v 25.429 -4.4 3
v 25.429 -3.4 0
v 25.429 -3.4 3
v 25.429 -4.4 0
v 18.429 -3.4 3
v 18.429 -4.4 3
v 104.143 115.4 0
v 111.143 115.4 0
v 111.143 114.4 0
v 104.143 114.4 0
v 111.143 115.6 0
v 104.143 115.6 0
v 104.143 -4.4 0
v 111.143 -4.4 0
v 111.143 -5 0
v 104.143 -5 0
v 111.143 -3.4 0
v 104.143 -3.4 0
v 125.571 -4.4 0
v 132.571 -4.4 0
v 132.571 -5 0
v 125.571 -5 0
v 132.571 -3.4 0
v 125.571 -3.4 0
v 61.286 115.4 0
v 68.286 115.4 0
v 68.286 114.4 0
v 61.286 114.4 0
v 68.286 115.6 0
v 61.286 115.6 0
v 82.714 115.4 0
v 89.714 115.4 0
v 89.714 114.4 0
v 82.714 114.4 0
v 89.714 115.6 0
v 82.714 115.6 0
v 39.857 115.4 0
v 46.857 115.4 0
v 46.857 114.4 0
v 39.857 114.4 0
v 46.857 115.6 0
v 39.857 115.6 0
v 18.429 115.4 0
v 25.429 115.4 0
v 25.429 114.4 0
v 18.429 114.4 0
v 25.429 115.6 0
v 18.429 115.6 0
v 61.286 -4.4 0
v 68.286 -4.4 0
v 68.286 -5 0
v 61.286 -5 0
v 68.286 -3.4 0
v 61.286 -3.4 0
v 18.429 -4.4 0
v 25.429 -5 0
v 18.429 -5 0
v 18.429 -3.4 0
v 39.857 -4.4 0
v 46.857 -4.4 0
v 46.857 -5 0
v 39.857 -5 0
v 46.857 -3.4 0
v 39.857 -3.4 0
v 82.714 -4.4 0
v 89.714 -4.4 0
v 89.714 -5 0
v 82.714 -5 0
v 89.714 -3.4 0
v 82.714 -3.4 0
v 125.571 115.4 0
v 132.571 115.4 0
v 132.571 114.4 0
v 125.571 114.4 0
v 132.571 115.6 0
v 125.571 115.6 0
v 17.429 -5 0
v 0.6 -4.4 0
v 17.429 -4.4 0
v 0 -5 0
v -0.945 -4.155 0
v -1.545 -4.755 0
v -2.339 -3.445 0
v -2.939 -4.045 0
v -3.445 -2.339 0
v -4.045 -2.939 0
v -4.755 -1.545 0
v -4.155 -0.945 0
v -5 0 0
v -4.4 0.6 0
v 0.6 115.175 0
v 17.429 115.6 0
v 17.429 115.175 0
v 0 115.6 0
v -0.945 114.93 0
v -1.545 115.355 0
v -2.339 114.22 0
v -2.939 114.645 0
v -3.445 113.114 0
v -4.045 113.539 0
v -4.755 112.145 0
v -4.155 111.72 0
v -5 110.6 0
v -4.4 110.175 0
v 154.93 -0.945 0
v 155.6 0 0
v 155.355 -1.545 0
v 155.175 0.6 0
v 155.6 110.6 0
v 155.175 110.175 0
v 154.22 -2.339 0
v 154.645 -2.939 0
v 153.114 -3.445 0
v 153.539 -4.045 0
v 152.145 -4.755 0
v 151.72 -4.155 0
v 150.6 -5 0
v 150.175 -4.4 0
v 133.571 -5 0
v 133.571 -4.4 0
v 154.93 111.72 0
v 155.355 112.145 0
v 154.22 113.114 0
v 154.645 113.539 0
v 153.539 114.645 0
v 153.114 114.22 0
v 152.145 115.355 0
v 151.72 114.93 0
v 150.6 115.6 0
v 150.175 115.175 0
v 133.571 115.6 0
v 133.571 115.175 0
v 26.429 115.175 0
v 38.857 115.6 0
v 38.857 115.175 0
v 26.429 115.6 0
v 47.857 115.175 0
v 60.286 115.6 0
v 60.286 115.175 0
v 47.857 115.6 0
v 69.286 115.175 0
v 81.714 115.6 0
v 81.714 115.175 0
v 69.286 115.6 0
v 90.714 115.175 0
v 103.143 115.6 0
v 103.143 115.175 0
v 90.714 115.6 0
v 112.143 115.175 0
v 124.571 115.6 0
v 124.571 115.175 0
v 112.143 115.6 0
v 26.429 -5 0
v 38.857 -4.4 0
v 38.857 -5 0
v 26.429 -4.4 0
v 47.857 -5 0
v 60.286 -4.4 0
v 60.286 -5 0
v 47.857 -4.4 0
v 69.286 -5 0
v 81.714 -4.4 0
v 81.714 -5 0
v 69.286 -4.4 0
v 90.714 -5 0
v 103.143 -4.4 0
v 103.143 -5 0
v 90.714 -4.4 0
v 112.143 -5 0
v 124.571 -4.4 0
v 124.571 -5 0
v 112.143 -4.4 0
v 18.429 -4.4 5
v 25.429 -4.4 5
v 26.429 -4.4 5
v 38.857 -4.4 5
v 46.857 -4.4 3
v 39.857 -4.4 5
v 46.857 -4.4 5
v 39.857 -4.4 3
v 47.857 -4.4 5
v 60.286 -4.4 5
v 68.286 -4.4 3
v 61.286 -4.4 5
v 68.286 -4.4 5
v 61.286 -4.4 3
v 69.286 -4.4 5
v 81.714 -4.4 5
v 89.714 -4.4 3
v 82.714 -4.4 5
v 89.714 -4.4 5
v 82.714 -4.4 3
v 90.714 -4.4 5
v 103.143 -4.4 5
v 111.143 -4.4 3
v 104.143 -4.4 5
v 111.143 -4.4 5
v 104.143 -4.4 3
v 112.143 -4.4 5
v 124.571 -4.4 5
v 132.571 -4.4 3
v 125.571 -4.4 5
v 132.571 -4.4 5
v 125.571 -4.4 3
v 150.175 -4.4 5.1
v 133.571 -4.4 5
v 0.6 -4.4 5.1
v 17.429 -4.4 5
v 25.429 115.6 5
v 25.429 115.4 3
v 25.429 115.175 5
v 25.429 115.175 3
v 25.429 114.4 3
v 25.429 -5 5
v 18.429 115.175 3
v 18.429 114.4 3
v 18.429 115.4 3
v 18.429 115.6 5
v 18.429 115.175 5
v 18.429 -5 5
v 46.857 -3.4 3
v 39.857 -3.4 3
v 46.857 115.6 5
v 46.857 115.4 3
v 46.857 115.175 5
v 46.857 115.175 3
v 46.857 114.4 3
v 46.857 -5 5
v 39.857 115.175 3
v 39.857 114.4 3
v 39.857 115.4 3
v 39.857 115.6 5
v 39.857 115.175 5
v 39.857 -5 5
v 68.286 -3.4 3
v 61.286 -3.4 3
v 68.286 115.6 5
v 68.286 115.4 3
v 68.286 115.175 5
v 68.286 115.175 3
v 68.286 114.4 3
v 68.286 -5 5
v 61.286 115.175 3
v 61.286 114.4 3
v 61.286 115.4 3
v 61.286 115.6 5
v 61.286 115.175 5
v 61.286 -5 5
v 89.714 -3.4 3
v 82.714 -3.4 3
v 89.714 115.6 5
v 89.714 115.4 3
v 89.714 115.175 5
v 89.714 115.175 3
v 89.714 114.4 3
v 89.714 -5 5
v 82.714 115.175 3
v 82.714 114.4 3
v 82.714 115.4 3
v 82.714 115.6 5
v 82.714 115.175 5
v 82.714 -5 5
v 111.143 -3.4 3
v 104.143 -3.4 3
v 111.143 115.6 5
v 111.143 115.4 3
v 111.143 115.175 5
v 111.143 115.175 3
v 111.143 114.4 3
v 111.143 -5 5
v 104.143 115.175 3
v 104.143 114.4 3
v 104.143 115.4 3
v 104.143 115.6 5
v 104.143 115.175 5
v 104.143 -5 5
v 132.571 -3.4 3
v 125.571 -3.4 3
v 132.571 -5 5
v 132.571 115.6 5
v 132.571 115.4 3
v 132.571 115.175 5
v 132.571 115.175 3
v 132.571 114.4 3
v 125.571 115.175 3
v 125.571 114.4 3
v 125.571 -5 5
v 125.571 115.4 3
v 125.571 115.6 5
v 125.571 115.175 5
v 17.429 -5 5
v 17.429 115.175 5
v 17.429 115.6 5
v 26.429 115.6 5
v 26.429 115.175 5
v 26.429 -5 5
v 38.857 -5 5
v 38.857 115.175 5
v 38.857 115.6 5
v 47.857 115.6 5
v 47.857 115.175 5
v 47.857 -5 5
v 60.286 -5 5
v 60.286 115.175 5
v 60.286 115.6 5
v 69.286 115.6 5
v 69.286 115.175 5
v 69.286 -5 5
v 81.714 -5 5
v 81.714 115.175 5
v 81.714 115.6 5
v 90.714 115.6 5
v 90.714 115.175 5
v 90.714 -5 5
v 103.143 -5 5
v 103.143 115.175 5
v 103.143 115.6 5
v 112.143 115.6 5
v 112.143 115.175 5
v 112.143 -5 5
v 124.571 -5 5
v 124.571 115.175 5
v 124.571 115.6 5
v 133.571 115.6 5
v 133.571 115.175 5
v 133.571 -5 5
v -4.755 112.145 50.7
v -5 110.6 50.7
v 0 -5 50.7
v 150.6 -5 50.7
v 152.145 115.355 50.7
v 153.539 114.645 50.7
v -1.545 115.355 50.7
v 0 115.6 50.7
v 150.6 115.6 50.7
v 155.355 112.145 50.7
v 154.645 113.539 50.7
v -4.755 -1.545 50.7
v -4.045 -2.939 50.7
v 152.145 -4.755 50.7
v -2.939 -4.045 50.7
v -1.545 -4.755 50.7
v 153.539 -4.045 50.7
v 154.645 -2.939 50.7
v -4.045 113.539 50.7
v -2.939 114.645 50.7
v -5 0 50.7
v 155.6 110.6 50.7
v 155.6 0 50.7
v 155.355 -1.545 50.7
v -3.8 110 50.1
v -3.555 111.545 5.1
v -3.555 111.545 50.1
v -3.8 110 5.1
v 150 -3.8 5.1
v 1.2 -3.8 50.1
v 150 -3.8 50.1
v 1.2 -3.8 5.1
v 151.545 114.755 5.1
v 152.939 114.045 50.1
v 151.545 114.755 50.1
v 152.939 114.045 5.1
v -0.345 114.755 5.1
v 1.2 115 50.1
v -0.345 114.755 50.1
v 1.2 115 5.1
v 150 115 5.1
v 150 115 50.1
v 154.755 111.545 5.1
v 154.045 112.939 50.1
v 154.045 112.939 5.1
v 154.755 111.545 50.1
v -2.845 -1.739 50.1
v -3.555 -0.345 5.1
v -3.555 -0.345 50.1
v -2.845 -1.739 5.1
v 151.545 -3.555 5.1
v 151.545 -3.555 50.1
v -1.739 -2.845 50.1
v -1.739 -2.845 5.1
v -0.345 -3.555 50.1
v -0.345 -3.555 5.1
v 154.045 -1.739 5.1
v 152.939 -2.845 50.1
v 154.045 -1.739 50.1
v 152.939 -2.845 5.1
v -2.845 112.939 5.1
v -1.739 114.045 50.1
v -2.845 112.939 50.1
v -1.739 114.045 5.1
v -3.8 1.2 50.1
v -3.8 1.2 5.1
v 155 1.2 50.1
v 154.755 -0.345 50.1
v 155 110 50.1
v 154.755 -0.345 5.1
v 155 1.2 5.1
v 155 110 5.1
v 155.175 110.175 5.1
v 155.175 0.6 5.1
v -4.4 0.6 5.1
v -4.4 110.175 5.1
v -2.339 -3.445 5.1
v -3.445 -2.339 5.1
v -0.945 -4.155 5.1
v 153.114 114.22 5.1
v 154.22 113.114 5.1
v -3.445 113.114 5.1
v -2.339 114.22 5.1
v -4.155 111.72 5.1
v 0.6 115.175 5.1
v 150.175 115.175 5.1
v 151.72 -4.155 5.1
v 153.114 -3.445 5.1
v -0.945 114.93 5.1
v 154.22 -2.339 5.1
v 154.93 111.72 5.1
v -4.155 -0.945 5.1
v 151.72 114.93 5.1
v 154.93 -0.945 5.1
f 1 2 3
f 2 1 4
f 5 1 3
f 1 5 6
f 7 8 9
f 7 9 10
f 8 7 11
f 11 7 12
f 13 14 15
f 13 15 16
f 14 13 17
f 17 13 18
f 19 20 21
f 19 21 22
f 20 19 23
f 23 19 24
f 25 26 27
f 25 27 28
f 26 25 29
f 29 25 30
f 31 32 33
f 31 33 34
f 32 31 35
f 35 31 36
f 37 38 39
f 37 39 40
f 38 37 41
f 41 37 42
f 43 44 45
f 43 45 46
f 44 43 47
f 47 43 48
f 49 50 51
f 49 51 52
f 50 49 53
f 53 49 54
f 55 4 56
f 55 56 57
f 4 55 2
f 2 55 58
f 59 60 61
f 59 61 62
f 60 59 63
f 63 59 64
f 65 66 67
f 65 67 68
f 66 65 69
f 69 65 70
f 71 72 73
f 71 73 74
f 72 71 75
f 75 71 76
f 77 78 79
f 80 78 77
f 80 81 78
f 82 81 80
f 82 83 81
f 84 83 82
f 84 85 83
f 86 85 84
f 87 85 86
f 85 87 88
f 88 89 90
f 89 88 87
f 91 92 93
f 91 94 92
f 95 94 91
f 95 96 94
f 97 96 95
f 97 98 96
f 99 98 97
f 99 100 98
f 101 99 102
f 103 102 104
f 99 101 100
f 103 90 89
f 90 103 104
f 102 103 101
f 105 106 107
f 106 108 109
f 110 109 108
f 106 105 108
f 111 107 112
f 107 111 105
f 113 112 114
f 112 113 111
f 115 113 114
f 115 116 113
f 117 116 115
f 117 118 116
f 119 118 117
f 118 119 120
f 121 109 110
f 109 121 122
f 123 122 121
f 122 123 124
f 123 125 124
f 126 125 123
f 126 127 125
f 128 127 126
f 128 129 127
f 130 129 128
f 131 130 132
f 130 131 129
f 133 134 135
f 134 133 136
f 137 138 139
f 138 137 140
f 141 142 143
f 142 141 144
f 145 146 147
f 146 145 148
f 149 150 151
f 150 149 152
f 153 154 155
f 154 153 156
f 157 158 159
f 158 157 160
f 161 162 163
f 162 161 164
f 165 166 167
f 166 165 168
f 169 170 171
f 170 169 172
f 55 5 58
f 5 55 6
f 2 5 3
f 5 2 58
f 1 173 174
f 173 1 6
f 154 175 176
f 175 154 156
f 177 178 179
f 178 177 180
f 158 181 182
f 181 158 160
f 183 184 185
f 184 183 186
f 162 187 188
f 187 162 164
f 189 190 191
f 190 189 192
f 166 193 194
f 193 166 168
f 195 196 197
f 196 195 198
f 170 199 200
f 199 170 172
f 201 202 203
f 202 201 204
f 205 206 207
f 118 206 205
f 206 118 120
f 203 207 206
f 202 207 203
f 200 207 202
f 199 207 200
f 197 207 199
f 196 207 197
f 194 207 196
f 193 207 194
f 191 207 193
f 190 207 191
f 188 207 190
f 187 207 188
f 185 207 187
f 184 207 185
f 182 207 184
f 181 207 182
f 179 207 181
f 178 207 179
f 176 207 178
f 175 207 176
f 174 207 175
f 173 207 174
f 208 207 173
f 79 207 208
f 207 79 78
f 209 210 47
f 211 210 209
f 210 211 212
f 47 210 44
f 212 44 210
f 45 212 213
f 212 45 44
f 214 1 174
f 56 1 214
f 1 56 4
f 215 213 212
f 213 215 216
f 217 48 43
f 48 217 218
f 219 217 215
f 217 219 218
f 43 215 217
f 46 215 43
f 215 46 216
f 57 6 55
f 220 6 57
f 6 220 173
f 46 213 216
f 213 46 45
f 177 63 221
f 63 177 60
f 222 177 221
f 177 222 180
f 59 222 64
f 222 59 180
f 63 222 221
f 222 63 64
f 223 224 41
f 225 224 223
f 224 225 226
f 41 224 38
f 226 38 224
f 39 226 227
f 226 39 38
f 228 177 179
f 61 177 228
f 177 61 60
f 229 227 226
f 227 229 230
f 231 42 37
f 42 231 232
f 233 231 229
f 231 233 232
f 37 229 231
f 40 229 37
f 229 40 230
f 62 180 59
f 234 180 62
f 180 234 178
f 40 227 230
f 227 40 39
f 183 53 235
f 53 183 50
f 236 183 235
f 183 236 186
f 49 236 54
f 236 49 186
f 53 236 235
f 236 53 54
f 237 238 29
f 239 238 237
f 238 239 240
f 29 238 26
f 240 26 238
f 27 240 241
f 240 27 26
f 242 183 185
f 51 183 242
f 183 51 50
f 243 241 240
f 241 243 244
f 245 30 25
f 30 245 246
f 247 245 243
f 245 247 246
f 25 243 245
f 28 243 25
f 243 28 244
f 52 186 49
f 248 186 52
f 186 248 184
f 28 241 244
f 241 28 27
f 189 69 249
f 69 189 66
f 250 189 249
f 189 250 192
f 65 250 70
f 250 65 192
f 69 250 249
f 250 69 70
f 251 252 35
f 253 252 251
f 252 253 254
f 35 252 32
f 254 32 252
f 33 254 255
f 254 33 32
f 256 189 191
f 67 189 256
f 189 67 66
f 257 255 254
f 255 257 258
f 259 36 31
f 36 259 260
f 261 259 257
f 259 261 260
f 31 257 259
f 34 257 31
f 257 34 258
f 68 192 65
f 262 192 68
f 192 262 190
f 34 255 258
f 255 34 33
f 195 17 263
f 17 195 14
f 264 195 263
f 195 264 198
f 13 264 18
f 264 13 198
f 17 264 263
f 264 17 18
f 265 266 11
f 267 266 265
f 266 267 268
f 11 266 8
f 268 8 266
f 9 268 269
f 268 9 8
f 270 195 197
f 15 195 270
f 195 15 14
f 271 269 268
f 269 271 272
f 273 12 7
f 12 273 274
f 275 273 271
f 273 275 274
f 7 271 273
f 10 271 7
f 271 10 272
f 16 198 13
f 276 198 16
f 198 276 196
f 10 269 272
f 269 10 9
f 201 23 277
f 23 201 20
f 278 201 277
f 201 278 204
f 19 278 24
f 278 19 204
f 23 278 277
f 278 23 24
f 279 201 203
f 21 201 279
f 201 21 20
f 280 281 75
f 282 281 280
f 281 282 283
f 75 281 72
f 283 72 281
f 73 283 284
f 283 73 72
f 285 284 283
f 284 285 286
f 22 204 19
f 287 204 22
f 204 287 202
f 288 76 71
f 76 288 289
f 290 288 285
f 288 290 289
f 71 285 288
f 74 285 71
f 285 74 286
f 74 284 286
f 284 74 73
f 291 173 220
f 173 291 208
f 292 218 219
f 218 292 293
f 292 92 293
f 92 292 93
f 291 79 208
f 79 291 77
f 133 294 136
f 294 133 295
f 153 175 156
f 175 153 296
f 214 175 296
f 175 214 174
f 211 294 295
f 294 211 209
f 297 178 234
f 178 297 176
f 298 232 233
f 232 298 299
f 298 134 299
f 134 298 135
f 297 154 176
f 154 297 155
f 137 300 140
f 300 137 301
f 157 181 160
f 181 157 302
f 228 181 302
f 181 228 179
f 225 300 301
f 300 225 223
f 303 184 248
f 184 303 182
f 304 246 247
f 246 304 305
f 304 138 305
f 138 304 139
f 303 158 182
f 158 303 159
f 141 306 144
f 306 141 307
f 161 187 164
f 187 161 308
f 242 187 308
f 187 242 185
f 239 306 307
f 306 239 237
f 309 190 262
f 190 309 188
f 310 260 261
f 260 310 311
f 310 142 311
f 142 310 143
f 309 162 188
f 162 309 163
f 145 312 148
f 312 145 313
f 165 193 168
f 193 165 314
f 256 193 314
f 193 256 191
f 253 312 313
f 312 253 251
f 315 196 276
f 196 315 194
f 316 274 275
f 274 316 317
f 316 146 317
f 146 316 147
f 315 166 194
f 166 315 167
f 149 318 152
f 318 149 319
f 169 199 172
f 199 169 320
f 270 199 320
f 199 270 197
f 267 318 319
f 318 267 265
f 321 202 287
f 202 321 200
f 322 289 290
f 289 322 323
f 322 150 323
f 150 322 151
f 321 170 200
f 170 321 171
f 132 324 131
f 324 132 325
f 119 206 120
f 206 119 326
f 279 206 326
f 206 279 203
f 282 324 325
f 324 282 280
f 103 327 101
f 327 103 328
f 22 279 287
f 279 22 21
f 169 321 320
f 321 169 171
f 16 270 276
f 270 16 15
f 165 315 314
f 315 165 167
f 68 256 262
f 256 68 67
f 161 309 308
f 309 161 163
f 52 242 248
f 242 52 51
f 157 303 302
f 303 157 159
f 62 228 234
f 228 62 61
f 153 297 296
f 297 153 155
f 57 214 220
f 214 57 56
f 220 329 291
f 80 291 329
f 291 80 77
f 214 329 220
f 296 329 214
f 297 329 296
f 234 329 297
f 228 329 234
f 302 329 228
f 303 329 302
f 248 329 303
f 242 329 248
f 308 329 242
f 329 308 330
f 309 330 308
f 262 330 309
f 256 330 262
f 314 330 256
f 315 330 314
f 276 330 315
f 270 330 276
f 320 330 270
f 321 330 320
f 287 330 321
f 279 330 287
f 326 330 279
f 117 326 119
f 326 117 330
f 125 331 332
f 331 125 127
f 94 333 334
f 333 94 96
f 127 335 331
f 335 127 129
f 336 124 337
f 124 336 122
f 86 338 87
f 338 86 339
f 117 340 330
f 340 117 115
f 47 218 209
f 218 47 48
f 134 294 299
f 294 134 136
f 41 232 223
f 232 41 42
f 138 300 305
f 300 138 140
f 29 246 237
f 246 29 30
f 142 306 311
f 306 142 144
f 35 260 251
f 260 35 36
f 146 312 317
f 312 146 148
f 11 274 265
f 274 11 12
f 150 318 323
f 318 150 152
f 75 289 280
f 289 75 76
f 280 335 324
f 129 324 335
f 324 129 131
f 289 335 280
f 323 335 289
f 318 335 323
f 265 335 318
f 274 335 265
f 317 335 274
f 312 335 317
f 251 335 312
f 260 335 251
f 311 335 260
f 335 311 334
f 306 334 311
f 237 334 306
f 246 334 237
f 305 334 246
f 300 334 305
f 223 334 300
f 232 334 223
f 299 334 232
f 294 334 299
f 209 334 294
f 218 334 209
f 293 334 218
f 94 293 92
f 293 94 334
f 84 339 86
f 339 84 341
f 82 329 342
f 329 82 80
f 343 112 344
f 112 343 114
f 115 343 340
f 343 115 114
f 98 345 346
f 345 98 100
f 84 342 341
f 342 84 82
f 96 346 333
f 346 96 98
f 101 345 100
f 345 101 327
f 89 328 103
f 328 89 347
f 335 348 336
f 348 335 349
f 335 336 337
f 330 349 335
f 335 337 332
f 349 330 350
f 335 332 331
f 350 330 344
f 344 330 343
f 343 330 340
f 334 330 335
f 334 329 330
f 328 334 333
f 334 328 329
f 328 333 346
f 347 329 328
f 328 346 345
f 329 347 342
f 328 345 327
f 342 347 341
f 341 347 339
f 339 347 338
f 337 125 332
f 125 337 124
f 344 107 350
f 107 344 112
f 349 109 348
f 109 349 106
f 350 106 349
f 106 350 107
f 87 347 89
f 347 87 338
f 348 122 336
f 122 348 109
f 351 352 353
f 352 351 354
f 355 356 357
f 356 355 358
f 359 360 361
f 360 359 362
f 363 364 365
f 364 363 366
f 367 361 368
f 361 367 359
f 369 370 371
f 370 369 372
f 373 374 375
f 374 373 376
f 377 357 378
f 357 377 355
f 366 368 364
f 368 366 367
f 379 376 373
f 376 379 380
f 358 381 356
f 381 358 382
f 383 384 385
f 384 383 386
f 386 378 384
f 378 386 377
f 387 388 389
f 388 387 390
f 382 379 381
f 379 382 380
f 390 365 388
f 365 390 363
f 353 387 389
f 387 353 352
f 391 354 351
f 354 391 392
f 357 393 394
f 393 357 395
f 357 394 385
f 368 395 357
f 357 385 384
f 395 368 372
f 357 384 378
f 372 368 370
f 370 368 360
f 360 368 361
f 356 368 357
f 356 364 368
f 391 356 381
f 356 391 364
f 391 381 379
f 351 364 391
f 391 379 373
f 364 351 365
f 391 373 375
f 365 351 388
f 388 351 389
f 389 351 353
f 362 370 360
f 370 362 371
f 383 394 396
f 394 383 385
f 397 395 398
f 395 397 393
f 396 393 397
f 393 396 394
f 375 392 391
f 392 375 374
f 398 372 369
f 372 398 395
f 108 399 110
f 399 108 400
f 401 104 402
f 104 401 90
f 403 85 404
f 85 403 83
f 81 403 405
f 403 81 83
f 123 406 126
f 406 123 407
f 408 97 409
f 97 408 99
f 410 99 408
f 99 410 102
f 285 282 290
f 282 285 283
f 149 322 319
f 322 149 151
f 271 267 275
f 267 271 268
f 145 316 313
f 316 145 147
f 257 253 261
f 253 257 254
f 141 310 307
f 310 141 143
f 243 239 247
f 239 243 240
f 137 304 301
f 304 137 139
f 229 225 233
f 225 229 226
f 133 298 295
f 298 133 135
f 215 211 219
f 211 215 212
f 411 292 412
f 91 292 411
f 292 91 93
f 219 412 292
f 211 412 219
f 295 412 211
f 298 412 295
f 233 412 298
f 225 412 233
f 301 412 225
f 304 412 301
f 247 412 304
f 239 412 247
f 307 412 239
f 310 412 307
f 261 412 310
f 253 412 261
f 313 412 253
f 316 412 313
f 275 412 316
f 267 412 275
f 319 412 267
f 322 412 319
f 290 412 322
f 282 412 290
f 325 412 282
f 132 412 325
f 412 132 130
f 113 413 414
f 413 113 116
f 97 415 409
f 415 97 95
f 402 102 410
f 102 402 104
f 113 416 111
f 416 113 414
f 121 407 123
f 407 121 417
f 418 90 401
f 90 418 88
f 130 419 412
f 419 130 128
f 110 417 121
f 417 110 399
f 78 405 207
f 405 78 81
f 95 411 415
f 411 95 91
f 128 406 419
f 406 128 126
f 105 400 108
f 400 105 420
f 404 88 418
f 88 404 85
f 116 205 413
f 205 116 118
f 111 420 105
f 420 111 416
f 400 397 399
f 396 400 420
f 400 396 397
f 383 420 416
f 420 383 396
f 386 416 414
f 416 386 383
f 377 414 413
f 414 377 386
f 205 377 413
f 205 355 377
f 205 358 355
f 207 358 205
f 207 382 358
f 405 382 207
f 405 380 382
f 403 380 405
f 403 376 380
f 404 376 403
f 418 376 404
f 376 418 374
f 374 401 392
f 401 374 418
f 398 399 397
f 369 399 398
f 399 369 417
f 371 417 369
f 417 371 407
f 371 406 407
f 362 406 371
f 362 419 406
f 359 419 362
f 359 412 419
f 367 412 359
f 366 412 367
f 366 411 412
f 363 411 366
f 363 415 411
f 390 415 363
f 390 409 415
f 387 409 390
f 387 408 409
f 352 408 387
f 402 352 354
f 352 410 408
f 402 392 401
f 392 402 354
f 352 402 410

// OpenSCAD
height = 50;
mount_hole = 3.5;
clear = 0.175;
thickness = 1.2;
baseboard_thickness = 2;
teeth_width = 8;
teeth_count = 6;
teeth_size = 1;

$fn=20;

module leg () {
    difference () {
        cylinder(r=MLAB_grid/2 + 0.3,h=legs_height);
        cylinder(r=MLAB_grid/2 - 0.3,h=legs_height);
    }
}
																			// teeth
		for(count = [1:teeth_count]){
			position = 150/(teeth_count+1)*count;
			#translate ([position-teeth_width/2+1,-5+thickness/2,0]) cube([teeth_width-1, teeth_size, 5-baseboard_thickness]);
			translate ([position-teeth_width/2+1,110+5-thickness/2,0]) cube([teeth_width-1, teeth_size, 5-baseboard_thickness]);
		}


difference () {
	minkowski() {
		cube([150+thickness/2,110+thickness/2,height+thickness/2]);          // base plastics brick
		cylinder(r=5,h=0.1);
	}
	translate ([thickness, thickness, 0])
		minkowski() {
			cube([150-thickness, 110-thickness, height]);          // hollow
			cylinder(r=5,h=0.1);
		}

	translate ([thickness/2, thickness/2, 0])
		difference () {
			minkowski() {
				cube([150-thickness/2+clear, 110-thickness/2+clear, 5]);          // hollow for BASE1115
				cylinder(r=5,h=0.1);
			}
		}
		for(count = [1:teeth_count]){												// teeth space
			position = 150/(teeth_count+1)*count;
			translate ([position-teeth_width/2,-5-thickness,0]) cube([1,110+10+2*thickness,5]);
			translate ([position+teeth_width/2,-5-thickness,0]) cube([1,110+10+2*thickness,5]);
		}
}
